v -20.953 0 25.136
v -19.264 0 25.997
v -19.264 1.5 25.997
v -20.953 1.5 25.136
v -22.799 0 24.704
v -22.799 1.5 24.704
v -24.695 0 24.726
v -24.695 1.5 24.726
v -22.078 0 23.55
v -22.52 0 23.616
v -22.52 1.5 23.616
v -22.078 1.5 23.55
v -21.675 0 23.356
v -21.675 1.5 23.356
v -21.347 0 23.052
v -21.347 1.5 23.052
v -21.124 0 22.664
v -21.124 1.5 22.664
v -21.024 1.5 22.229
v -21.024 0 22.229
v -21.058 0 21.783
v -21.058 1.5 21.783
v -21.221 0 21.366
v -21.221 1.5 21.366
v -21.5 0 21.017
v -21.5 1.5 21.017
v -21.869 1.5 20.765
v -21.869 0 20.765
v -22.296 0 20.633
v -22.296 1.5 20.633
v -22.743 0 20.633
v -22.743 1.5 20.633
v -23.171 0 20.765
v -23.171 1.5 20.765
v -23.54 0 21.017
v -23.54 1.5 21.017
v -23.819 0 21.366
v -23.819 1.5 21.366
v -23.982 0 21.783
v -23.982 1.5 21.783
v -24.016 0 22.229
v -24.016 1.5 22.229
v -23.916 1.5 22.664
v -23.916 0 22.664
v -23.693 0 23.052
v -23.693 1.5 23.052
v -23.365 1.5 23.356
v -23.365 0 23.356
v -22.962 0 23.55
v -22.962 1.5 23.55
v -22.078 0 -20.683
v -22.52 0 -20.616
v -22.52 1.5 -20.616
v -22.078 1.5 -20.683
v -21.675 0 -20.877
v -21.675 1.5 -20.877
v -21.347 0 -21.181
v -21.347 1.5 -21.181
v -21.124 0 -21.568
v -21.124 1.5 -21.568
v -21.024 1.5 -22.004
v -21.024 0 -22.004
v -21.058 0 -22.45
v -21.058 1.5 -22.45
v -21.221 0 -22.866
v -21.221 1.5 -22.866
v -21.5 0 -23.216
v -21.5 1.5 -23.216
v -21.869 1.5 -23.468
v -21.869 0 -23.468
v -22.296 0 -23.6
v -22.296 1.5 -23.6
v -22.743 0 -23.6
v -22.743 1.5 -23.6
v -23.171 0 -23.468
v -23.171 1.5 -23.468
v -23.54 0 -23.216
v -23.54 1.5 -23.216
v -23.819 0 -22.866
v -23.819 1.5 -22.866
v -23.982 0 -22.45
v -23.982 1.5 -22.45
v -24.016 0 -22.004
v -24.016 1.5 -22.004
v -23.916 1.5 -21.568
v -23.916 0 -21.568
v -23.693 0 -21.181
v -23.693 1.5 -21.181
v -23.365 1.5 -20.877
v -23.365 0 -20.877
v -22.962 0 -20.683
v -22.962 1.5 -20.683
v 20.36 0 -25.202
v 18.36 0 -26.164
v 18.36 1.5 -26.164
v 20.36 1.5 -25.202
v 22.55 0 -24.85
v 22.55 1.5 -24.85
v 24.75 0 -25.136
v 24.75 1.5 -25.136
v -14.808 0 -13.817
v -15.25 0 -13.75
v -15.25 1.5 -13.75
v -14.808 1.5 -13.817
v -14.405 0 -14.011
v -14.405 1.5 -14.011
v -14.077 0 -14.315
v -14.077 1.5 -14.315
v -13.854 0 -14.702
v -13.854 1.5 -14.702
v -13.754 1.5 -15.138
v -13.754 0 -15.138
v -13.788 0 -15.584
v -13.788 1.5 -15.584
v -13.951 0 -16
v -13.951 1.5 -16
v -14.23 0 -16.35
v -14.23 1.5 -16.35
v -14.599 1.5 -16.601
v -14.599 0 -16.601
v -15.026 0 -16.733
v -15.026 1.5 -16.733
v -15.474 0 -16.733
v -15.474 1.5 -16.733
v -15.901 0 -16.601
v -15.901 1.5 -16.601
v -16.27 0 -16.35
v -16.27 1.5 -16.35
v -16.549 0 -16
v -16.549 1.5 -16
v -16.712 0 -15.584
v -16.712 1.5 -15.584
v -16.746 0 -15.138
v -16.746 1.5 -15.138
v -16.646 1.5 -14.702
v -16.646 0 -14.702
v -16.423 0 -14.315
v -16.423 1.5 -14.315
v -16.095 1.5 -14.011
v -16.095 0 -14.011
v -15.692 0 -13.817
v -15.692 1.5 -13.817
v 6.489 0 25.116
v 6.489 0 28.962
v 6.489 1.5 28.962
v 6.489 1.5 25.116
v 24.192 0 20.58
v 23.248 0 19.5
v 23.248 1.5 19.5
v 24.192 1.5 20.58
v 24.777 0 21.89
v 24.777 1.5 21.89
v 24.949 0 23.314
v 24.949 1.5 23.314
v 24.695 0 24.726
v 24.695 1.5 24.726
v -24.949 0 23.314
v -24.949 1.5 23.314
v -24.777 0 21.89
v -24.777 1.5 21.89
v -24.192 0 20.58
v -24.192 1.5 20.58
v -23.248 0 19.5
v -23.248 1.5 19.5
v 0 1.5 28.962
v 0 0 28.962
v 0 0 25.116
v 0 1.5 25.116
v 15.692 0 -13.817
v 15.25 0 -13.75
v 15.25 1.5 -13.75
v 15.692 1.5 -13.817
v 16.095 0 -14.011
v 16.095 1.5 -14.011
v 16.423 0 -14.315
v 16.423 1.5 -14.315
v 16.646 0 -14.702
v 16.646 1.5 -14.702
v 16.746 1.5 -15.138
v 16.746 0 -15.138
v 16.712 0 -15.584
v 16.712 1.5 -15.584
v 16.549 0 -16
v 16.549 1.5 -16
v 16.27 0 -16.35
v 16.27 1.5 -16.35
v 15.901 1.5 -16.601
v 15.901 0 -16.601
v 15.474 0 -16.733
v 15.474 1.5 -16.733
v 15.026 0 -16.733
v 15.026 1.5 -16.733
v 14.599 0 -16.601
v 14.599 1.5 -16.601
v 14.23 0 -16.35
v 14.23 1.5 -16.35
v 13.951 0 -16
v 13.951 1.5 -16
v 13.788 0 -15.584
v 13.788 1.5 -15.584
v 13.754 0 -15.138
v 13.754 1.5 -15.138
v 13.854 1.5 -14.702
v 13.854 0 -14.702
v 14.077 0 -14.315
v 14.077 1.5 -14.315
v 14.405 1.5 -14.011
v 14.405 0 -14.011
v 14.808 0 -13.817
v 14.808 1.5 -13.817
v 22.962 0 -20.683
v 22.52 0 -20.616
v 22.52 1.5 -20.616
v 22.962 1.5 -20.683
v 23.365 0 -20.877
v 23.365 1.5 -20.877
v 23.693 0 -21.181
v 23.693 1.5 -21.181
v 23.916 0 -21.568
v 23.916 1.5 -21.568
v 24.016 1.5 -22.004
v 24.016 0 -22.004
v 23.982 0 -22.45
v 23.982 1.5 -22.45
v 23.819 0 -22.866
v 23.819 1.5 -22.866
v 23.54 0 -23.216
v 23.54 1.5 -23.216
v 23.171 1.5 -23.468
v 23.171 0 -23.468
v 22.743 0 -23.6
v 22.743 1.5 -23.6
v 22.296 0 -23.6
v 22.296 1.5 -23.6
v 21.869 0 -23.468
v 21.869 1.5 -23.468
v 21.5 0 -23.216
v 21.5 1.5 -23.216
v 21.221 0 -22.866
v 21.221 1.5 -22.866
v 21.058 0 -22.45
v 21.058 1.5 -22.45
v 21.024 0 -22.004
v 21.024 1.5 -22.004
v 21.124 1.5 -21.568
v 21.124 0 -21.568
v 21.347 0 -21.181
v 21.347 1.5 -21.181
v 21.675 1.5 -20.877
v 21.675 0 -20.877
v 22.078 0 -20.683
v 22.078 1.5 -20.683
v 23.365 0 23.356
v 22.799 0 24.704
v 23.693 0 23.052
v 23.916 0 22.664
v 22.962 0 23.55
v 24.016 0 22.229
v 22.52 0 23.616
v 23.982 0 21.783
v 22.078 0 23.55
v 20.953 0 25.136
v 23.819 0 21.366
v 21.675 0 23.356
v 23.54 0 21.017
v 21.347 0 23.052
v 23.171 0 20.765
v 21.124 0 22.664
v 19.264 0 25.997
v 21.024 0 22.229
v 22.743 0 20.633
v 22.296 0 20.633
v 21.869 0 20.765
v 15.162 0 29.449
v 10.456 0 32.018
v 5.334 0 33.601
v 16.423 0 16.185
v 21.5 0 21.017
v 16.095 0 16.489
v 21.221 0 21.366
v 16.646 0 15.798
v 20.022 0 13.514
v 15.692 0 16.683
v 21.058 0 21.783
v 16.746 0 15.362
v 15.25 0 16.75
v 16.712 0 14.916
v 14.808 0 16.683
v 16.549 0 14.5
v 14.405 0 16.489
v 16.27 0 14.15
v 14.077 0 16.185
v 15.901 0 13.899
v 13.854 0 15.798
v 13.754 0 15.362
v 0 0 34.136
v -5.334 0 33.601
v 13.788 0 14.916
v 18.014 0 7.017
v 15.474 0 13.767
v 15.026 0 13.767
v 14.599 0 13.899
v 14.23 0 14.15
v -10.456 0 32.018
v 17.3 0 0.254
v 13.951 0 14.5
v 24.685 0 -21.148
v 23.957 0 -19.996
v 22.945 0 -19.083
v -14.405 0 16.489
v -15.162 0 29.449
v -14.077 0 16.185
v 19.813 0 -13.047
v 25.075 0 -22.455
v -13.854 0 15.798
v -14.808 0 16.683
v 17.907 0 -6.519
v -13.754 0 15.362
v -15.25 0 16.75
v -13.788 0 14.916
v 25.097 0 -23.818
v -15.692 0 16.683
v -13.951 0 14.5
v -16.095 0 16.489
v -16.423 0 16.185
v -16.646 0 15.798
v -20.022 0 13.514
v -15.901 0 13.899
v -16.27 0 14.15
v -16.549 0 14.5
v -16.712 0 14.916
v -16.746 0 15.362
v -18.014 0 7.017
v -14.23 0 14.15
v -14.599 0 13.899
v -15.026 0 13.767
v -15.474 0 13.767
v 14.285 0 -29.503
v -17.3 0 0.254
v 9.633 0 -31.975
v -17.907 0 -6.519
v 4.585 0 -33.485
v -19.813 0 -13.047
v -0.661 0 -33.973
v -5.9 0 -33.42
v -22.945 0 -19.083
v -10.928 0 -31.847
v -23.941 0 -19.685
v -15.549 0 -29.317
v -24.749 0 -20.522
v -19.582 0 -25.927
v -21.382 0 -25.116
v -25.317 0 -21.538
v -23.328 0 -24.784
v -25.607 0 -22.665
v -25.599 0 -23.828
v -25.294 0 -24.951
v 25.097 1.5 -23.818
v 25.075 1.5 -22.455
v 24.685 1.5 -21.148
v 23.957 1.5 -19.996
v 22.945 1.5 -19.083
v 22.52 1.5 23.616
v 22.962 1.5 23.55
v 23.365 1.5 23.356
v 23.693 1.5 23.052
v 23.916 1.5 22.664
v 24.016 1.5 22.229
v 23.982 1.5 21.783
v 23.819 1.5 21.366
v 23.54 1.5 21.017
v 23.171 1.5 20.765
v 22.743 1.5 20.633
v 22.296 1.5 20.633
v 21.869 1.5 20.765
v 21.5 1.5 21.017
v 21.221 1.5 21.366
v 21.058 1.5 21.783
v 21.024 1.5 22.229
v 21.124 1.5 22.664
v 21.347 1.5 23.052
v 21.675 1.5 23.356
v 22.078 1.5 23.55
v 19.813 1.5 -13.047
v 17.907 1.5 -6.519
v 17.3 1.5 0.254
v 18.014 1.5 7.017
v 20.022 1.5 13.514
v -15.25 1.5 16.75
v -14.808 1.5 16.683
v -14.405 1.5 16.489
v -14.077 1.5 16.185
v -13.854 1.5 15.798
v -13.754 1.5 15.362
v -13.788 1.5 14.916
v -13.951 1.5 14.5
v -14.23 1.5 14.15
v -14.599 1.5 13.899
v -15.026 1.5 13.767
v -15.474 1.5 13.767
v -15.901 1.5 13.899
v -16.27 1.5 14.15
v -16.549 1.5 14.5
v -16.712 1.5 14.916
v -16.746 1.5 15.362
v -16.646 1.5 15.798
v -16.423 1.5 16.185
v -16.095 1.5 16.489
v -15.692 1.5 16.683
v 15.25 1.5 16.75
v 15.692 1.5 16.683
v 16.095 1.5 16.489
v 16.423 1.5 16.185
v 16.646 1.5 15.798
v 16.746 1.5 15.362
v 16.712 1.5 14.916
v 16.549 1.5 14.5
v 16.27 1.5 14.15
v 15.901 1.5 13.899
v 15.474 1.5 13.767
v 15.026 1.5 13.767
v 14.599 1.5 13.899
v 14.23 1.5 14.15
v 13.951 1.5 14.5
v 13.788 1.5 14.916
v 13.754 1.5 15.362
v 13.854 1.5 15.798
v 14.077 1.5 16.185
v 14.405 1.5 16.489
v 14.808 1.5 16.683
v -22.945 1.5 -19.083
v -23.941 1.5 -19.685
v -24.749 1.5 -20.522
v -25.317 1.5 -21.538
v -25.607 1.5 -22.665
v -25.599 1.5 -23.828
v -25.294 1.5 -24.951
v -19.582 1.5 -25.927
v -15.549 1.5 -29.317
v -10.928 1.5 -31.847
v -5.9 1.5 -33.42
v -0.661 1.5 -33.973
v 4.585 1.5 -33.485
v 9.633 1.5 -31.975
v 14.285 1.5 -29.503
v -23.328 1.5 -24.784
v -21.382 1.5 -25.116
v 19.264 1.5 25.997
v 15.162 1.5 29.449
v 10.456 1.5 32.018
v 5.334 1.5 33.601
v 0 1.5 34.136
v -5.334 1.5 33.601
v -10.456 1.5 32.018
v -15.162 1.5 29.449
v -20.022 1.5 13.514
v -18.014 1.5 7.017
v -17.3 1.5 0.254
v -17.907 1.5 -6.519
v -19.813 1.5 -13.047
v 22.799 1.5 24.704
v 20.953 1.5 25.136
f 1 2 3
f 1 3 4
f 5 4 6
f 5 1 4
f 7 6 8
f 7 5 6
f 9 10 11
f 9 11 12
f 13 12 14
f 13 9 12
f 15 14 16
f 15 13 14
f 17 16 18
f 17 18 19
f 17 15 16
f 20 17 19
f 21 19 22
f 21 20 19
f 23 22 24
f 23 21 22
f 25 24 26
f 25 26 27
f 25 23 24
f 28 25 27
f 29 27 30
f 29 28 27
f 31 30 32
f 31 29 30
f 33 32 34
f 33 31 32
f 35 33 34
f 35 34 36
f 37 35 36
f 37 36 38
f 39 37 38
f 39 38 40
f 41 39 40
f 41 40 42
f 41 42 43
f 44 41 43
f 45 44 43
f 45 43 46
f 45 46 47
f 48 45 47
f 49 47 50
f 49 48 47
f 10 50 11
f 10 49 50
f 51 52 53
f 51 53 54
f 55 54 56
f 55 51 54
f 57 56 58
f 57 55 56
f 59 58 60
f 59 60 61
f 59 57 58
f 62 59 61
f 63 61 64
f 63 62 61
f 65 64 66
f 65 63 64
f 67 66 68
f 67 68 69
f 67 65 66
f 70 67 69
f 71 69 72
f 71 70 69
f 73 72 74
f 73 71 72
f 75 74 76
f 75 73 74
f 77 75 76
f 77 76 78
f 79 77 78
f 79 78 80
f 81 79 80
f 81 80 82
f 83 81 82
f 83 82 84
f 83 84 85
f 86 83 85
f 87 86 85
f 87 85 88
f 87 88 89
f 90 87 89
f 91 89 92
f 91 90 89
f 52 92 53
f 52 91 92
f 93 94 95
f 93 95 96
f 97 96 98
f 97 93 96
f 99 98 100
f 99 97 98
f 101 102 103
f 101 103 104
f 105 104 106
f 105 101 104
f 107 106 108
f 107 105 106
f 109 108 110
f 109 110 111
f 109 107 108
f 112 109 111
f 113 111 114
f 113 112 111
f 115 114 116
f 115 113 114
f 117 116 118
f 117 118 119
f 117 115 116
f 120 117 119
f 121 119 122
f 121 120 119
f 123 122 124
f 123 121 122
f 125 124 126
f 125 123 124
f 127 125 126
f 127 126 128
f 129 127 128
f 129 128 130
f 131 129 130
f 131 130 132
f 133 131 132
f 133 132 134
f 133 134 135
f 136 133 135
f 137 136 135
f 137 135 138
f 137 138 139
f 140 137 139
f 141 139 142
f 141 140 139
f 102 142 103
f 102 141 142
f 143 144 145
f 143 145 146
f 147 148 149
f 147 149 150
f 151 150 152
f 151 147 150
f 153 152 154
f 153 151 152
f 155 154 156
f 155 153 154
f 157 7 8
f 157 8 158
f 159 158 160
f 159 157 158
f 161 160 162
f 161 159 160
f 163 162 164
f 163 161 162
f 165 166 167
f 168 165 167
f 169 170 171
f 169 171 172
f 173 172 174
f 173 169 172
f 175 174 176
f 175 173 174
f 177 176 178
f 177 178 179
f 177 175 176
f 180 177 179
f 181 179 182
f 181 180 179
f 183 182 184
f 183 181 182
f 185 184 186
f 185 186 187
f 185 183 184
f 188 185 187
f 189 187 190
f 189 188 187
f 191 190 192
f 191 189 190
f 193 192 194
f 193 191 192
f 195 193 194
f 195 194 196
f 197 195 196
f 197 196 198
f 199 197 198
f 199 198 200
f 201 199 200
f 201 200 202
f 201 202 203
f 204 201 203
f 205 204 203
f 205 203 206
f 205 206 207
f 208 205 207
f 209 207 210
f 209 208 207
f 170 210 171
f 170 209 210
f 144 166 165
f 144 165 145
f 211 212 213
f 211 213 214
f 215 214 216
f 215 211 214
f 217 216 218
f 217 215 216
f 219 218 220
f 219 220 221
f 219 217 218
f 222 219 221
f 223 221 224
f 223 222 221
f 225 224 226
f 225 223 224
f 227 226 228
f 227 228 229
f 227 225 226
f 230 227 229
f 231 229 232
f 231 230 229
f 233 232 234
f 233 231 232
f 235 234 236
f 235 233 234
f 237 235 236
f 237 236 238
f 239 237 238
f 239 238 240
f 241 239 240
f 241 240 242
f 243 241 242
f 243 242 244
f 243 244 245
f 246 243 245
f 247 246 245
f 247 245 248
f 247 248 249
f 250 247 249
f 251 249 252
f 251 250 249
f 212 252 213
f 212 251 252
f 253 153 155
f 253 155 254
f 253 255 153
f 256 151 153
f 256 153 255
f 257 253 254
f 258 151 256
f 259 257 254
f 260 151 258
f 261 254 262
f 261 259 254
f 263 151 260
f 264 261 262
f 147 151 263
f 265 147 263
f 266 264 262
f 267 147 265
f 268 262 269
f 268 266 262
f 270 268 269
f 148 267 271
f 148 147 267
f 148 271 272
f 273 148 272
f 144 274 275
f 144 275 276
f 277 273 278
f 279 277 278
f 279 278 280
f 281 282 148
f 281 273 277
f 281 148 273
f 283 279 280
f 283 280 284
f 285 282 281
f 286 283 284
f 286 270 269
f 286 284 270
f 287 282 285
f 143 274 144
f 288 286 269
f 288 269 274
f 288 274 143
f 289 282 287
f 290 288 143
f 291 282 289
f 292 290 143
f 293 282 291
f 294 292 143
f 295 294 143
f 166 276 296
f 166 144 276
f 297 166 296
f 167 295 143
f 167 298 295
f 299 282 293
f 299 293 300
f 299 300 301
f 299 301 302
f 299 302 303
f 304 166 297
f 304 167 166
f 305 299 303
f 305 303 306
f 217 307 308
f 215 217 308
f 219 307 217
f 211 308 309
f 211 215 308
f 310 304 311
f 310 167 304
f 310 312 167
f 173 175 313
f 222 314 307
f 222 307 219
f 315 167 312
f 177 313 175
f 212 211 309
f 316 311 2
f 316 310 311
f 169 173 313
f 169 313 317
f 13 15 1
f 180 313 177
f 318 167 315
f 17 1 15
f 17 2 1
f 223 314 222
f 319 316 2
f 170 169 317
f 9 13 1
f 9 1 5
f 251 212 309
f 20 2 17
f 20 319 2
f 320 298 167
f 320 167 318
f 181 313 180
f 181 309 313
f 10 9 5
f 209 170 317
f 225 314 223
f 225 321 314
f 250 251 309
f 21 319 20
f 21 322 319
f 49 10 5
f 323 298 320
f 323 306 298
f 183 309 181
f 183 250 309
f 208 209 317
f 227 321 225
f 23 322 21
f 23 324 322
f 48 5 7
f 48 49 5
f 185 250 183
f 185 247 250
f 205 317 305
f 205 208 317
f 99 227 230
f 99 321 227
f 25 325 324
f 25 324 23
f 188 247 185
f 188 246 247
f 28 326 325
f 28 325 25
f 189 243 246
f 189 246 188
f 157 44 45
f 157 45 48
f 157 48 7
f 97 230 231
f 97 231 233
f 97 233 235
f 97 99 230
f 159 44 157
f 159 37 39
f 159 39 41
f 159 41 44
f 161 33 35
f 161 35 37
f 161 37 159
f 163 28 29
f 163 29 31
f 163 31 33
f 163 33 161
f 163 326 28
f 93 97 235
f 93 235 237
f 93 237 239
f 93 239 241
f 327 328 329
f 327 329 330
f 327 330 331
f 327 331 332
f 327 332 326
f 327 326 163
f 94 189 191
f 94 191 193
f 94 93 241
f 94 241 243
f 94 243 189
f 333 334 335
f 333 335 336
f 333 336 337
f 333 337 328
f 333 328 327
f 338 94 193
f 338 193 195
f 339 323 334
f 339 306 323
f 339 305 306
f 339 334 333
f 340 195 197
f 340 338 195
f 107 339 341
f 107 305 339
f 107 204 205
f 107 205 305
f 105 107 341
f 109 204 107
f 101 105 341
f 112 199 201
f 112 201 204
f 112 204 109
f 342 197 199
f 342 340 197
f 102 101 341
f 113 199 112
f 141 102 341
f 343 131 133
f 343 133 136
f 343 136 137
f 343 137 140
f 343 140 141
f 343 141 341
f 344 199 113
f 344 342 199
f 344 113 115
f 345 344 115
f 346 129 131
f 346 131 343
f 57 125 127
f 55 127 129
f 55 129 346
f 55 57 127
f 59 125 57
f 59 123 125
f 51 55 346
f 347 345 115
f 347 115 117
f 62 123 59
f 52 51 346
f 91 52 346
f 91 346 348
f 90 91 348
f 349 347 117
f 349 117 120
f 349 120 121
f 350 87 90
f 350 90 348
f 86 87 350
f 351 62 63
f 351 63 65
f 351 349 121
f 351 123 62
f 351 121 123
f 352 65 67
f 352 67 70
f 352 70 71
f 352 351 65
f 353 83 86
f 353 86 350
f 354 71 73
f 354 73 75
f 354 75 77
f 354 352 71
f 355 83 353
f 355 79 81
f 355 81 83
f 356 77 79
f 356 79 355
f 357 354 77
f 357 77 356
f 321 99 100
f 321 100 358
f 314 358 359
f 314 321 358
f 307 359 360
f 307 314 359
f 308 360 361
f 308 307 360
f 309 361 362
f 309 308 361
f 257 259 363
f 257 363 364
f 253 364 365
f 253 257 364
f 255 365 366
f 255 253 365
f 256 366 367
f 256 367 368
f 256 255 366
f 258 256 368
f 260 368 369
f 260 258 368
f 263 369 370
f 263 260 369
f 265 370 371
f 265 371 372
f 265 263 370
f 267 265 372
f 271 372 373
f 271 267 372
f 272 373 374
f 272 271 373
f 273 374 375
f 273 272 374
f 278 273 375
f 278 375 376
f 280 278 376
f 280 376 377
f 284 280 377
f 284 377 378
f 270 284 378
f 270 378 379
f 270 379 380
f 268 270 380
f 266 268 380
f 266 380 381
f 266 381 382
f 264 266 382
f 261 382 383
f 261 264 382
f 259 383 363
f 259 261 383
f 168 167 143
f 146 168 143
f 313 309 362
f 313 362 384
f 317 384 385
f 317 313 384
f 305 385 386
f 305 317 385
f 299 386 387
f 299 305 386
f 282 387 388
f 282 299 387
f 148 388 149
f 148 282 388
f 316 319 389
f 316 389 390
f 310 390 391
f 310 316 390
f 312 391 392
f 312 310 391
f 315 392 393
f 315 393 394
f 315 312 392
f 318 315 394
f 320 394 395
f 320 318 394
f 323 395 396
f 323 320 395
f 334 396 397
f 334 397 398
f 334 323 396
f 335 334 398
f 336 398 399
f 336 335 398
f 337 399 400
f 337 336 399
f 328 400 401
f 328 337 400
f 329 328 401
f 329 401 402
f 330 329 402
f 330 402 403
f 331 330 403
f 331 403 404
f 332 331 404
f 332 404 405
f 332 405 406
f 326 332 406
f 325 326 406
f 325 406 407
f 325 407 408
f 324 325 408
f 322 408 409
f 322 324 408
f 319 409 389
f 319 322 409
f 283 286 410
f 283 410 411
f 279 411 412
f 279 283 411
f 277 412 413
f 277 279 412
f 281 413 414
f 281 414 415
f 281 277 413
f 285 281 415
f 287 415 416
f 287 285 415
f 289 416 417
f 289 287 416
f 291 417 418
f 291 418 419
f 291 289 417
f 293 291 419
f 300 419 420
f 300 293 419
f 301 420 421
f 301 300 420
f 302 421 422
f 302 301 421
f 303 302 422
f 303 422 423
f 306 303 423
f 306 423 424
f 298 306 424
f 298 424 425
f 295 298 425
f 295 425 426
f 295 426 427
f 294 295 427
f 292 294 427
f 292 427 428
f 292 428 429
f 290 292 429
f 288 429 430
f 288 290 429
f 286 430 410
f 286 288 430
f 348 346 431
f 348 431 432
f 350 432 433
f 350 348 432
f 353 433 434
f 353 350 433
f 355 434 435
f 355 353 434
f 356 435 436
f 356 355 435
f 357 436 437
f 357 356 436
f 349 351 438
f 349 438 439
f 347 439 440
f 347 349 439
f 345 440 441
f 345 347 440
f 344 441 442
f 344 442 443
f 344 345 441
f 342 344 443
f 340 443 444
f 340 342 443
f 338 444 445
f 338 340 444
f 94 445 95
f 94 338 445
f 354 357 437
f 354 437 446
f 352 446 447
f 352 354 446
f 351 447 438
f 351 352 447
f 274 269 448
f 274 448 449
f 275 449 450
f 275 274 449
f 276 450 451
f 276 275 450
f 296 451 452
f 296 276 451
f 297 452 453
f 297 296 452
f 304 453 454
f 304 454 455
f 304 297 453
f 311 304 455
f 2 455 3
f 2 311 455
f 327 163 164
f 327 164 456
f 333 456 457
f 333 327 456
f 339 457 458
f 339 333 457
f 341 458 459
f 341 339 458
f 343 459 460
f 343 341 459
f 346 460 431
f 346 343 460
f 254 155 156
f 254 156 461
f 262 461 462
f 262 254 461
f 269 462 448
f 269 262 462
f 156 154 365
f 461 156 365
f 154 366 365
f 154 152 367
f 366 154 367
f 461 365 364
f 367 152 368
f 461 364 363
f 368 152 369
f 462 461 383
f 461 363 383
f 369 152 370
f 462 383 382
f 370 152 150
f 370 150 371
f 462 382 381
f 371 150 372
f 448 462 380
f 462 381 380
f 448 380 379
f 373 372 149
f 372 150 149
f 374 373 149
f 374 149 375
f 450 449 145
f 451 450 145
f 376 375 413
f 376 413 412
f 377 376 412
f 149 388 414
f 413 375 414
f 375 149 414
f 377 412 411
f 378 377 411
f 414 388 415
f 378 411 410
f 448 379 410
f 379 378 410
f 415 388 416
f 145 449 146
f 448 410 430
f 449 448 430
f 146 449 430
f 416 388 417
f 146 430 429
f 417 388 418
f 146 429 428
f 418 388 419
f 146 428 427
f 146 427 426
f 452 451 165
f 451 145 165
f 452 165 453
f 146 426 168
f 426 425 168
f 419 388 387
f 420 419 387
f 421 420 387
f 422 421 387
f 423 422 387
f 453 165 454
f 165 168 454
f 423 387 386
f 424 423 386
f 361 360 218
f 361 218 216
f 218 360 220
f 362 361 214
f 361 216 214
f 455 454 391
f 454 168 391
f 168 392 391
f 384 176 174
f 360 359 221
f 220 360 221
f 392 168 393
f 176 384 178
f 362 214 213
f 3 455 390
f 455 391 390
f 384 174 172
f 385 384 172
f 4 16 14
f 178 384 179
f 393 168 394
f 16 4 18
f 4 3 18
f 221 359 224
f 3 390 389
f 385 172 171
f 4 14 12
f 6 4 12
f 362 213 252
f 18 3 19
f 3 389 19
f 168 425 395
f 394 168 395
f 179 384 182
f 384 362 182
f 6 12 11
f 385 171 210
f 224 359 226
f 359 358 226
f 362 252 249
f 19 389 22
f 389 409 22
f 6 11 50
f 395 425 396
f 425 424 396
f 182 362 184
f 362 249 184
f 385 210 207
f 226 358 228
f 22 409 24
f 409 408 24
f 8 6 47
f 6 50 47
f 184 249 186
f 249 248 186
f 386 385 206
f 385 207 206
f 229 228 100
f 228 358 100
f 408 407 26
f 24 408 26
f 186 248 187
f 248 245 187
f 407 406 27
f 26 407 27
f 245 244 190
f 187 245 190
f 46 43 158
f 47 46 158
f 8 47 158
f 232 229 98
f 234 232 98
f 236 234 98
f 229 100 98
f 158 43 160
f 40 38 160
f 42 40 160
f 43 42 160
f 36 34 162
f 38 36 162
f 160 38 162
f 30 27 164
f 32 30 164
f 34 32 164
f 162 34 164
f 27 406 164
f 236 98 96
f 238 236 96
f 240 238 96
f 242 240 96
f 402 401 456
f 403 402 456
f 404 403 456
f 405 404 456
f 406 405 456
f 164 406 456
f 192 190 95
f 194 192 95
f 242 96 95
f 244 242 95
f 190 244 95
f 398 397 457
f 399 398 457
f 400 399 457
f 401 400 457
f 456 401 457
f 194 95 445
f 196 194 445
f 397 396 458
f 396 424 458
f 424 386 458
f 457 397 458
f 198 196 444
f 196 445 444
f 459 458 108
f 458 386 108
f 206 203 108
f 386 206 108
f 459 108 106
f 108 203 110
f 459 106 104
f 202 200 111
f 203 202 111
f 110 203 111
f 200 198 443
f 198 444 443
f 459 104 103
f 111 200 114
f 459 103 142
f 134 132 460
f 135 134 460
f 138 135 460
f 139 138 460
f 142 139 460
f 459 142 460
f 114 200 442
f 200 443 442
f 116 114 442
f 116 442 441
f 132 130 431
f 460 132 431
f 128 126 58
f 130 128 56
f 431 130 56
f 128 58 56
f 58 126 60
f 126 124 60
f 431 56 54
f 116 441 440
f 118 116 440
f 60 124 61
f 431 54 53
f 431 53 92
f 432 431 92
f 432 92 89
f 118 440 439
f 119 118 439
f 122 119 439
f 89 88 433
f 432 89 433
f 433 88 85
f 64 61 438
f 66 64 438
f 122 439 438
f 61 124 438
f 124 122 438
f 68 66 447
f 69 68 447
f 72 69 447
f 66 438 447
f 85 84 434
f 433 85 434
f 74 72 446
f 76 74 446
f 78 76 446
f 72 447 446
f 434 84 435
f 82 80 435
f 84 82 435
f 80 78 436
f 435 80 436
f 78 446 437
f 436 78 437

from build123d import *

# Parameters (mm, degrees)
SKETCH2_R           = 1.5
SKETCH2_W           = 6.488584399
SKETCH2_H           = 3.846601045
BOSS_EXTRUDE2_DEPTH = 1.5


with BuildPart() as part:
    # Sketch2 → Boss-Extrude2 (new body)
    with BuildSketch(Plane(origin=(0, 0, 0), x_dir=(1, 0, 0), z_dir=(0, 1, 0))):
        with BuildLine():
            ThreePointArc((23.247996545, -19.500190875), (24.776607327, -21.890134515), (24.695421013, -24.725957202))
            ThreePointArc((24.695421013, -24.725957202), (21.863295263, -24.863949953), (19.264117039, -25.997197864))
            ThreePointArc((19.264117039, -25.997197864), (0, -34.136214734), (-19.264117039, -25.997197864))
            ThreePointArc((-19.264117039, -25.997197864), (-21.863295263, -24.863949953), (-24.695421013, -24.725957202))
            ThreePointArc((-24.695421013, -24.725957202), (-24.776607327, -21.890134515), (-23.247996545, -19.500190875))
            ThreePointArc((-23.247996545, -19.500190875), (-17.299915505, -0.254242625), (-22.945369046, 19.082640433))
            ThreePointArc((-22.945369046, 19.082640433), (-25.316903499, 21.537699802), (-25.294419588, 24.951053966))
            ThreePointArc((-25.294419588, 24.951053966), (-22.344172838, 24.887982121), (-19.582319286, 25.927260189))
            ThreePointArc((-19.582319286, 25.927260189), (-0.66060428, 33.9728721), (18.359891541, 26.163652643))
            ThreePointArc((18.359891541, 26.163652643), (21.442039723, 24.947145004), (24.750195634, 25.135911308))
            ThreePointArc((24.750195634, 25.135911308), (24.924707249, 21.788182903), (22.945369046, 19.082640433))
            ThreePointArc((22.945369046, 19.082640433), (17.299915505, -0.254242625), (23.247996545, -19.500190875))
        make_face()
        with Locations(Location((-15.25, 15.25, 0), (0, 0, 270))):
            Circle(SKETCH2_R, mode=Mode.SUBTRACT)
        with Locations(Location((15.25, 15.25, 0), (0, 0, 270))):
            Circle(SKETCH2_R, mode=Mode.SUBTRACT)
        with Locations(Location((-15.25, -15.25, 0), (0, 0, 270))):
            Circle(SKETCH2_R, mode=Mode.SUBTRACT)
        with Locations(Location((15.25, -15.25, 0), (0, 0, 270))):
            Circle(SKETCH2_R, mode=Mode.SUBTRACT)
        with Locations(Location((-22.519911508, 22.116468281, 0), (0, 0, 270))):
            Circle(SKETCH2_R, mode=Mode.SUBTRACT)
        with Locations(Location((22.519911508, 22.116468281, 0), (0, 0, 270))):
            Circle(SKETCH2_R, mode=Mode.SUBTRACT)
        with Locations(Location((22.519911508, -22.116468281, 0), (0, 0, 270))):
            Circle(SKETCH2_R, mode=Mode.SUBTRACT)
        with Locations(Location((-22.519911508, -22.116468281, 0), (0, 0, 270))):
            Circle(SKETCH2_R, mode=Mode.SUBTRACT)
        with Locations((3.2442922, -27.038937624)):
            Rectangle(SKETCH2_W, SKETCH2_H, mode=Mode.SUBTRACT)
    extrude(amount=BOSS_EXTRUDE2_DEPTH)


solid = part.part
